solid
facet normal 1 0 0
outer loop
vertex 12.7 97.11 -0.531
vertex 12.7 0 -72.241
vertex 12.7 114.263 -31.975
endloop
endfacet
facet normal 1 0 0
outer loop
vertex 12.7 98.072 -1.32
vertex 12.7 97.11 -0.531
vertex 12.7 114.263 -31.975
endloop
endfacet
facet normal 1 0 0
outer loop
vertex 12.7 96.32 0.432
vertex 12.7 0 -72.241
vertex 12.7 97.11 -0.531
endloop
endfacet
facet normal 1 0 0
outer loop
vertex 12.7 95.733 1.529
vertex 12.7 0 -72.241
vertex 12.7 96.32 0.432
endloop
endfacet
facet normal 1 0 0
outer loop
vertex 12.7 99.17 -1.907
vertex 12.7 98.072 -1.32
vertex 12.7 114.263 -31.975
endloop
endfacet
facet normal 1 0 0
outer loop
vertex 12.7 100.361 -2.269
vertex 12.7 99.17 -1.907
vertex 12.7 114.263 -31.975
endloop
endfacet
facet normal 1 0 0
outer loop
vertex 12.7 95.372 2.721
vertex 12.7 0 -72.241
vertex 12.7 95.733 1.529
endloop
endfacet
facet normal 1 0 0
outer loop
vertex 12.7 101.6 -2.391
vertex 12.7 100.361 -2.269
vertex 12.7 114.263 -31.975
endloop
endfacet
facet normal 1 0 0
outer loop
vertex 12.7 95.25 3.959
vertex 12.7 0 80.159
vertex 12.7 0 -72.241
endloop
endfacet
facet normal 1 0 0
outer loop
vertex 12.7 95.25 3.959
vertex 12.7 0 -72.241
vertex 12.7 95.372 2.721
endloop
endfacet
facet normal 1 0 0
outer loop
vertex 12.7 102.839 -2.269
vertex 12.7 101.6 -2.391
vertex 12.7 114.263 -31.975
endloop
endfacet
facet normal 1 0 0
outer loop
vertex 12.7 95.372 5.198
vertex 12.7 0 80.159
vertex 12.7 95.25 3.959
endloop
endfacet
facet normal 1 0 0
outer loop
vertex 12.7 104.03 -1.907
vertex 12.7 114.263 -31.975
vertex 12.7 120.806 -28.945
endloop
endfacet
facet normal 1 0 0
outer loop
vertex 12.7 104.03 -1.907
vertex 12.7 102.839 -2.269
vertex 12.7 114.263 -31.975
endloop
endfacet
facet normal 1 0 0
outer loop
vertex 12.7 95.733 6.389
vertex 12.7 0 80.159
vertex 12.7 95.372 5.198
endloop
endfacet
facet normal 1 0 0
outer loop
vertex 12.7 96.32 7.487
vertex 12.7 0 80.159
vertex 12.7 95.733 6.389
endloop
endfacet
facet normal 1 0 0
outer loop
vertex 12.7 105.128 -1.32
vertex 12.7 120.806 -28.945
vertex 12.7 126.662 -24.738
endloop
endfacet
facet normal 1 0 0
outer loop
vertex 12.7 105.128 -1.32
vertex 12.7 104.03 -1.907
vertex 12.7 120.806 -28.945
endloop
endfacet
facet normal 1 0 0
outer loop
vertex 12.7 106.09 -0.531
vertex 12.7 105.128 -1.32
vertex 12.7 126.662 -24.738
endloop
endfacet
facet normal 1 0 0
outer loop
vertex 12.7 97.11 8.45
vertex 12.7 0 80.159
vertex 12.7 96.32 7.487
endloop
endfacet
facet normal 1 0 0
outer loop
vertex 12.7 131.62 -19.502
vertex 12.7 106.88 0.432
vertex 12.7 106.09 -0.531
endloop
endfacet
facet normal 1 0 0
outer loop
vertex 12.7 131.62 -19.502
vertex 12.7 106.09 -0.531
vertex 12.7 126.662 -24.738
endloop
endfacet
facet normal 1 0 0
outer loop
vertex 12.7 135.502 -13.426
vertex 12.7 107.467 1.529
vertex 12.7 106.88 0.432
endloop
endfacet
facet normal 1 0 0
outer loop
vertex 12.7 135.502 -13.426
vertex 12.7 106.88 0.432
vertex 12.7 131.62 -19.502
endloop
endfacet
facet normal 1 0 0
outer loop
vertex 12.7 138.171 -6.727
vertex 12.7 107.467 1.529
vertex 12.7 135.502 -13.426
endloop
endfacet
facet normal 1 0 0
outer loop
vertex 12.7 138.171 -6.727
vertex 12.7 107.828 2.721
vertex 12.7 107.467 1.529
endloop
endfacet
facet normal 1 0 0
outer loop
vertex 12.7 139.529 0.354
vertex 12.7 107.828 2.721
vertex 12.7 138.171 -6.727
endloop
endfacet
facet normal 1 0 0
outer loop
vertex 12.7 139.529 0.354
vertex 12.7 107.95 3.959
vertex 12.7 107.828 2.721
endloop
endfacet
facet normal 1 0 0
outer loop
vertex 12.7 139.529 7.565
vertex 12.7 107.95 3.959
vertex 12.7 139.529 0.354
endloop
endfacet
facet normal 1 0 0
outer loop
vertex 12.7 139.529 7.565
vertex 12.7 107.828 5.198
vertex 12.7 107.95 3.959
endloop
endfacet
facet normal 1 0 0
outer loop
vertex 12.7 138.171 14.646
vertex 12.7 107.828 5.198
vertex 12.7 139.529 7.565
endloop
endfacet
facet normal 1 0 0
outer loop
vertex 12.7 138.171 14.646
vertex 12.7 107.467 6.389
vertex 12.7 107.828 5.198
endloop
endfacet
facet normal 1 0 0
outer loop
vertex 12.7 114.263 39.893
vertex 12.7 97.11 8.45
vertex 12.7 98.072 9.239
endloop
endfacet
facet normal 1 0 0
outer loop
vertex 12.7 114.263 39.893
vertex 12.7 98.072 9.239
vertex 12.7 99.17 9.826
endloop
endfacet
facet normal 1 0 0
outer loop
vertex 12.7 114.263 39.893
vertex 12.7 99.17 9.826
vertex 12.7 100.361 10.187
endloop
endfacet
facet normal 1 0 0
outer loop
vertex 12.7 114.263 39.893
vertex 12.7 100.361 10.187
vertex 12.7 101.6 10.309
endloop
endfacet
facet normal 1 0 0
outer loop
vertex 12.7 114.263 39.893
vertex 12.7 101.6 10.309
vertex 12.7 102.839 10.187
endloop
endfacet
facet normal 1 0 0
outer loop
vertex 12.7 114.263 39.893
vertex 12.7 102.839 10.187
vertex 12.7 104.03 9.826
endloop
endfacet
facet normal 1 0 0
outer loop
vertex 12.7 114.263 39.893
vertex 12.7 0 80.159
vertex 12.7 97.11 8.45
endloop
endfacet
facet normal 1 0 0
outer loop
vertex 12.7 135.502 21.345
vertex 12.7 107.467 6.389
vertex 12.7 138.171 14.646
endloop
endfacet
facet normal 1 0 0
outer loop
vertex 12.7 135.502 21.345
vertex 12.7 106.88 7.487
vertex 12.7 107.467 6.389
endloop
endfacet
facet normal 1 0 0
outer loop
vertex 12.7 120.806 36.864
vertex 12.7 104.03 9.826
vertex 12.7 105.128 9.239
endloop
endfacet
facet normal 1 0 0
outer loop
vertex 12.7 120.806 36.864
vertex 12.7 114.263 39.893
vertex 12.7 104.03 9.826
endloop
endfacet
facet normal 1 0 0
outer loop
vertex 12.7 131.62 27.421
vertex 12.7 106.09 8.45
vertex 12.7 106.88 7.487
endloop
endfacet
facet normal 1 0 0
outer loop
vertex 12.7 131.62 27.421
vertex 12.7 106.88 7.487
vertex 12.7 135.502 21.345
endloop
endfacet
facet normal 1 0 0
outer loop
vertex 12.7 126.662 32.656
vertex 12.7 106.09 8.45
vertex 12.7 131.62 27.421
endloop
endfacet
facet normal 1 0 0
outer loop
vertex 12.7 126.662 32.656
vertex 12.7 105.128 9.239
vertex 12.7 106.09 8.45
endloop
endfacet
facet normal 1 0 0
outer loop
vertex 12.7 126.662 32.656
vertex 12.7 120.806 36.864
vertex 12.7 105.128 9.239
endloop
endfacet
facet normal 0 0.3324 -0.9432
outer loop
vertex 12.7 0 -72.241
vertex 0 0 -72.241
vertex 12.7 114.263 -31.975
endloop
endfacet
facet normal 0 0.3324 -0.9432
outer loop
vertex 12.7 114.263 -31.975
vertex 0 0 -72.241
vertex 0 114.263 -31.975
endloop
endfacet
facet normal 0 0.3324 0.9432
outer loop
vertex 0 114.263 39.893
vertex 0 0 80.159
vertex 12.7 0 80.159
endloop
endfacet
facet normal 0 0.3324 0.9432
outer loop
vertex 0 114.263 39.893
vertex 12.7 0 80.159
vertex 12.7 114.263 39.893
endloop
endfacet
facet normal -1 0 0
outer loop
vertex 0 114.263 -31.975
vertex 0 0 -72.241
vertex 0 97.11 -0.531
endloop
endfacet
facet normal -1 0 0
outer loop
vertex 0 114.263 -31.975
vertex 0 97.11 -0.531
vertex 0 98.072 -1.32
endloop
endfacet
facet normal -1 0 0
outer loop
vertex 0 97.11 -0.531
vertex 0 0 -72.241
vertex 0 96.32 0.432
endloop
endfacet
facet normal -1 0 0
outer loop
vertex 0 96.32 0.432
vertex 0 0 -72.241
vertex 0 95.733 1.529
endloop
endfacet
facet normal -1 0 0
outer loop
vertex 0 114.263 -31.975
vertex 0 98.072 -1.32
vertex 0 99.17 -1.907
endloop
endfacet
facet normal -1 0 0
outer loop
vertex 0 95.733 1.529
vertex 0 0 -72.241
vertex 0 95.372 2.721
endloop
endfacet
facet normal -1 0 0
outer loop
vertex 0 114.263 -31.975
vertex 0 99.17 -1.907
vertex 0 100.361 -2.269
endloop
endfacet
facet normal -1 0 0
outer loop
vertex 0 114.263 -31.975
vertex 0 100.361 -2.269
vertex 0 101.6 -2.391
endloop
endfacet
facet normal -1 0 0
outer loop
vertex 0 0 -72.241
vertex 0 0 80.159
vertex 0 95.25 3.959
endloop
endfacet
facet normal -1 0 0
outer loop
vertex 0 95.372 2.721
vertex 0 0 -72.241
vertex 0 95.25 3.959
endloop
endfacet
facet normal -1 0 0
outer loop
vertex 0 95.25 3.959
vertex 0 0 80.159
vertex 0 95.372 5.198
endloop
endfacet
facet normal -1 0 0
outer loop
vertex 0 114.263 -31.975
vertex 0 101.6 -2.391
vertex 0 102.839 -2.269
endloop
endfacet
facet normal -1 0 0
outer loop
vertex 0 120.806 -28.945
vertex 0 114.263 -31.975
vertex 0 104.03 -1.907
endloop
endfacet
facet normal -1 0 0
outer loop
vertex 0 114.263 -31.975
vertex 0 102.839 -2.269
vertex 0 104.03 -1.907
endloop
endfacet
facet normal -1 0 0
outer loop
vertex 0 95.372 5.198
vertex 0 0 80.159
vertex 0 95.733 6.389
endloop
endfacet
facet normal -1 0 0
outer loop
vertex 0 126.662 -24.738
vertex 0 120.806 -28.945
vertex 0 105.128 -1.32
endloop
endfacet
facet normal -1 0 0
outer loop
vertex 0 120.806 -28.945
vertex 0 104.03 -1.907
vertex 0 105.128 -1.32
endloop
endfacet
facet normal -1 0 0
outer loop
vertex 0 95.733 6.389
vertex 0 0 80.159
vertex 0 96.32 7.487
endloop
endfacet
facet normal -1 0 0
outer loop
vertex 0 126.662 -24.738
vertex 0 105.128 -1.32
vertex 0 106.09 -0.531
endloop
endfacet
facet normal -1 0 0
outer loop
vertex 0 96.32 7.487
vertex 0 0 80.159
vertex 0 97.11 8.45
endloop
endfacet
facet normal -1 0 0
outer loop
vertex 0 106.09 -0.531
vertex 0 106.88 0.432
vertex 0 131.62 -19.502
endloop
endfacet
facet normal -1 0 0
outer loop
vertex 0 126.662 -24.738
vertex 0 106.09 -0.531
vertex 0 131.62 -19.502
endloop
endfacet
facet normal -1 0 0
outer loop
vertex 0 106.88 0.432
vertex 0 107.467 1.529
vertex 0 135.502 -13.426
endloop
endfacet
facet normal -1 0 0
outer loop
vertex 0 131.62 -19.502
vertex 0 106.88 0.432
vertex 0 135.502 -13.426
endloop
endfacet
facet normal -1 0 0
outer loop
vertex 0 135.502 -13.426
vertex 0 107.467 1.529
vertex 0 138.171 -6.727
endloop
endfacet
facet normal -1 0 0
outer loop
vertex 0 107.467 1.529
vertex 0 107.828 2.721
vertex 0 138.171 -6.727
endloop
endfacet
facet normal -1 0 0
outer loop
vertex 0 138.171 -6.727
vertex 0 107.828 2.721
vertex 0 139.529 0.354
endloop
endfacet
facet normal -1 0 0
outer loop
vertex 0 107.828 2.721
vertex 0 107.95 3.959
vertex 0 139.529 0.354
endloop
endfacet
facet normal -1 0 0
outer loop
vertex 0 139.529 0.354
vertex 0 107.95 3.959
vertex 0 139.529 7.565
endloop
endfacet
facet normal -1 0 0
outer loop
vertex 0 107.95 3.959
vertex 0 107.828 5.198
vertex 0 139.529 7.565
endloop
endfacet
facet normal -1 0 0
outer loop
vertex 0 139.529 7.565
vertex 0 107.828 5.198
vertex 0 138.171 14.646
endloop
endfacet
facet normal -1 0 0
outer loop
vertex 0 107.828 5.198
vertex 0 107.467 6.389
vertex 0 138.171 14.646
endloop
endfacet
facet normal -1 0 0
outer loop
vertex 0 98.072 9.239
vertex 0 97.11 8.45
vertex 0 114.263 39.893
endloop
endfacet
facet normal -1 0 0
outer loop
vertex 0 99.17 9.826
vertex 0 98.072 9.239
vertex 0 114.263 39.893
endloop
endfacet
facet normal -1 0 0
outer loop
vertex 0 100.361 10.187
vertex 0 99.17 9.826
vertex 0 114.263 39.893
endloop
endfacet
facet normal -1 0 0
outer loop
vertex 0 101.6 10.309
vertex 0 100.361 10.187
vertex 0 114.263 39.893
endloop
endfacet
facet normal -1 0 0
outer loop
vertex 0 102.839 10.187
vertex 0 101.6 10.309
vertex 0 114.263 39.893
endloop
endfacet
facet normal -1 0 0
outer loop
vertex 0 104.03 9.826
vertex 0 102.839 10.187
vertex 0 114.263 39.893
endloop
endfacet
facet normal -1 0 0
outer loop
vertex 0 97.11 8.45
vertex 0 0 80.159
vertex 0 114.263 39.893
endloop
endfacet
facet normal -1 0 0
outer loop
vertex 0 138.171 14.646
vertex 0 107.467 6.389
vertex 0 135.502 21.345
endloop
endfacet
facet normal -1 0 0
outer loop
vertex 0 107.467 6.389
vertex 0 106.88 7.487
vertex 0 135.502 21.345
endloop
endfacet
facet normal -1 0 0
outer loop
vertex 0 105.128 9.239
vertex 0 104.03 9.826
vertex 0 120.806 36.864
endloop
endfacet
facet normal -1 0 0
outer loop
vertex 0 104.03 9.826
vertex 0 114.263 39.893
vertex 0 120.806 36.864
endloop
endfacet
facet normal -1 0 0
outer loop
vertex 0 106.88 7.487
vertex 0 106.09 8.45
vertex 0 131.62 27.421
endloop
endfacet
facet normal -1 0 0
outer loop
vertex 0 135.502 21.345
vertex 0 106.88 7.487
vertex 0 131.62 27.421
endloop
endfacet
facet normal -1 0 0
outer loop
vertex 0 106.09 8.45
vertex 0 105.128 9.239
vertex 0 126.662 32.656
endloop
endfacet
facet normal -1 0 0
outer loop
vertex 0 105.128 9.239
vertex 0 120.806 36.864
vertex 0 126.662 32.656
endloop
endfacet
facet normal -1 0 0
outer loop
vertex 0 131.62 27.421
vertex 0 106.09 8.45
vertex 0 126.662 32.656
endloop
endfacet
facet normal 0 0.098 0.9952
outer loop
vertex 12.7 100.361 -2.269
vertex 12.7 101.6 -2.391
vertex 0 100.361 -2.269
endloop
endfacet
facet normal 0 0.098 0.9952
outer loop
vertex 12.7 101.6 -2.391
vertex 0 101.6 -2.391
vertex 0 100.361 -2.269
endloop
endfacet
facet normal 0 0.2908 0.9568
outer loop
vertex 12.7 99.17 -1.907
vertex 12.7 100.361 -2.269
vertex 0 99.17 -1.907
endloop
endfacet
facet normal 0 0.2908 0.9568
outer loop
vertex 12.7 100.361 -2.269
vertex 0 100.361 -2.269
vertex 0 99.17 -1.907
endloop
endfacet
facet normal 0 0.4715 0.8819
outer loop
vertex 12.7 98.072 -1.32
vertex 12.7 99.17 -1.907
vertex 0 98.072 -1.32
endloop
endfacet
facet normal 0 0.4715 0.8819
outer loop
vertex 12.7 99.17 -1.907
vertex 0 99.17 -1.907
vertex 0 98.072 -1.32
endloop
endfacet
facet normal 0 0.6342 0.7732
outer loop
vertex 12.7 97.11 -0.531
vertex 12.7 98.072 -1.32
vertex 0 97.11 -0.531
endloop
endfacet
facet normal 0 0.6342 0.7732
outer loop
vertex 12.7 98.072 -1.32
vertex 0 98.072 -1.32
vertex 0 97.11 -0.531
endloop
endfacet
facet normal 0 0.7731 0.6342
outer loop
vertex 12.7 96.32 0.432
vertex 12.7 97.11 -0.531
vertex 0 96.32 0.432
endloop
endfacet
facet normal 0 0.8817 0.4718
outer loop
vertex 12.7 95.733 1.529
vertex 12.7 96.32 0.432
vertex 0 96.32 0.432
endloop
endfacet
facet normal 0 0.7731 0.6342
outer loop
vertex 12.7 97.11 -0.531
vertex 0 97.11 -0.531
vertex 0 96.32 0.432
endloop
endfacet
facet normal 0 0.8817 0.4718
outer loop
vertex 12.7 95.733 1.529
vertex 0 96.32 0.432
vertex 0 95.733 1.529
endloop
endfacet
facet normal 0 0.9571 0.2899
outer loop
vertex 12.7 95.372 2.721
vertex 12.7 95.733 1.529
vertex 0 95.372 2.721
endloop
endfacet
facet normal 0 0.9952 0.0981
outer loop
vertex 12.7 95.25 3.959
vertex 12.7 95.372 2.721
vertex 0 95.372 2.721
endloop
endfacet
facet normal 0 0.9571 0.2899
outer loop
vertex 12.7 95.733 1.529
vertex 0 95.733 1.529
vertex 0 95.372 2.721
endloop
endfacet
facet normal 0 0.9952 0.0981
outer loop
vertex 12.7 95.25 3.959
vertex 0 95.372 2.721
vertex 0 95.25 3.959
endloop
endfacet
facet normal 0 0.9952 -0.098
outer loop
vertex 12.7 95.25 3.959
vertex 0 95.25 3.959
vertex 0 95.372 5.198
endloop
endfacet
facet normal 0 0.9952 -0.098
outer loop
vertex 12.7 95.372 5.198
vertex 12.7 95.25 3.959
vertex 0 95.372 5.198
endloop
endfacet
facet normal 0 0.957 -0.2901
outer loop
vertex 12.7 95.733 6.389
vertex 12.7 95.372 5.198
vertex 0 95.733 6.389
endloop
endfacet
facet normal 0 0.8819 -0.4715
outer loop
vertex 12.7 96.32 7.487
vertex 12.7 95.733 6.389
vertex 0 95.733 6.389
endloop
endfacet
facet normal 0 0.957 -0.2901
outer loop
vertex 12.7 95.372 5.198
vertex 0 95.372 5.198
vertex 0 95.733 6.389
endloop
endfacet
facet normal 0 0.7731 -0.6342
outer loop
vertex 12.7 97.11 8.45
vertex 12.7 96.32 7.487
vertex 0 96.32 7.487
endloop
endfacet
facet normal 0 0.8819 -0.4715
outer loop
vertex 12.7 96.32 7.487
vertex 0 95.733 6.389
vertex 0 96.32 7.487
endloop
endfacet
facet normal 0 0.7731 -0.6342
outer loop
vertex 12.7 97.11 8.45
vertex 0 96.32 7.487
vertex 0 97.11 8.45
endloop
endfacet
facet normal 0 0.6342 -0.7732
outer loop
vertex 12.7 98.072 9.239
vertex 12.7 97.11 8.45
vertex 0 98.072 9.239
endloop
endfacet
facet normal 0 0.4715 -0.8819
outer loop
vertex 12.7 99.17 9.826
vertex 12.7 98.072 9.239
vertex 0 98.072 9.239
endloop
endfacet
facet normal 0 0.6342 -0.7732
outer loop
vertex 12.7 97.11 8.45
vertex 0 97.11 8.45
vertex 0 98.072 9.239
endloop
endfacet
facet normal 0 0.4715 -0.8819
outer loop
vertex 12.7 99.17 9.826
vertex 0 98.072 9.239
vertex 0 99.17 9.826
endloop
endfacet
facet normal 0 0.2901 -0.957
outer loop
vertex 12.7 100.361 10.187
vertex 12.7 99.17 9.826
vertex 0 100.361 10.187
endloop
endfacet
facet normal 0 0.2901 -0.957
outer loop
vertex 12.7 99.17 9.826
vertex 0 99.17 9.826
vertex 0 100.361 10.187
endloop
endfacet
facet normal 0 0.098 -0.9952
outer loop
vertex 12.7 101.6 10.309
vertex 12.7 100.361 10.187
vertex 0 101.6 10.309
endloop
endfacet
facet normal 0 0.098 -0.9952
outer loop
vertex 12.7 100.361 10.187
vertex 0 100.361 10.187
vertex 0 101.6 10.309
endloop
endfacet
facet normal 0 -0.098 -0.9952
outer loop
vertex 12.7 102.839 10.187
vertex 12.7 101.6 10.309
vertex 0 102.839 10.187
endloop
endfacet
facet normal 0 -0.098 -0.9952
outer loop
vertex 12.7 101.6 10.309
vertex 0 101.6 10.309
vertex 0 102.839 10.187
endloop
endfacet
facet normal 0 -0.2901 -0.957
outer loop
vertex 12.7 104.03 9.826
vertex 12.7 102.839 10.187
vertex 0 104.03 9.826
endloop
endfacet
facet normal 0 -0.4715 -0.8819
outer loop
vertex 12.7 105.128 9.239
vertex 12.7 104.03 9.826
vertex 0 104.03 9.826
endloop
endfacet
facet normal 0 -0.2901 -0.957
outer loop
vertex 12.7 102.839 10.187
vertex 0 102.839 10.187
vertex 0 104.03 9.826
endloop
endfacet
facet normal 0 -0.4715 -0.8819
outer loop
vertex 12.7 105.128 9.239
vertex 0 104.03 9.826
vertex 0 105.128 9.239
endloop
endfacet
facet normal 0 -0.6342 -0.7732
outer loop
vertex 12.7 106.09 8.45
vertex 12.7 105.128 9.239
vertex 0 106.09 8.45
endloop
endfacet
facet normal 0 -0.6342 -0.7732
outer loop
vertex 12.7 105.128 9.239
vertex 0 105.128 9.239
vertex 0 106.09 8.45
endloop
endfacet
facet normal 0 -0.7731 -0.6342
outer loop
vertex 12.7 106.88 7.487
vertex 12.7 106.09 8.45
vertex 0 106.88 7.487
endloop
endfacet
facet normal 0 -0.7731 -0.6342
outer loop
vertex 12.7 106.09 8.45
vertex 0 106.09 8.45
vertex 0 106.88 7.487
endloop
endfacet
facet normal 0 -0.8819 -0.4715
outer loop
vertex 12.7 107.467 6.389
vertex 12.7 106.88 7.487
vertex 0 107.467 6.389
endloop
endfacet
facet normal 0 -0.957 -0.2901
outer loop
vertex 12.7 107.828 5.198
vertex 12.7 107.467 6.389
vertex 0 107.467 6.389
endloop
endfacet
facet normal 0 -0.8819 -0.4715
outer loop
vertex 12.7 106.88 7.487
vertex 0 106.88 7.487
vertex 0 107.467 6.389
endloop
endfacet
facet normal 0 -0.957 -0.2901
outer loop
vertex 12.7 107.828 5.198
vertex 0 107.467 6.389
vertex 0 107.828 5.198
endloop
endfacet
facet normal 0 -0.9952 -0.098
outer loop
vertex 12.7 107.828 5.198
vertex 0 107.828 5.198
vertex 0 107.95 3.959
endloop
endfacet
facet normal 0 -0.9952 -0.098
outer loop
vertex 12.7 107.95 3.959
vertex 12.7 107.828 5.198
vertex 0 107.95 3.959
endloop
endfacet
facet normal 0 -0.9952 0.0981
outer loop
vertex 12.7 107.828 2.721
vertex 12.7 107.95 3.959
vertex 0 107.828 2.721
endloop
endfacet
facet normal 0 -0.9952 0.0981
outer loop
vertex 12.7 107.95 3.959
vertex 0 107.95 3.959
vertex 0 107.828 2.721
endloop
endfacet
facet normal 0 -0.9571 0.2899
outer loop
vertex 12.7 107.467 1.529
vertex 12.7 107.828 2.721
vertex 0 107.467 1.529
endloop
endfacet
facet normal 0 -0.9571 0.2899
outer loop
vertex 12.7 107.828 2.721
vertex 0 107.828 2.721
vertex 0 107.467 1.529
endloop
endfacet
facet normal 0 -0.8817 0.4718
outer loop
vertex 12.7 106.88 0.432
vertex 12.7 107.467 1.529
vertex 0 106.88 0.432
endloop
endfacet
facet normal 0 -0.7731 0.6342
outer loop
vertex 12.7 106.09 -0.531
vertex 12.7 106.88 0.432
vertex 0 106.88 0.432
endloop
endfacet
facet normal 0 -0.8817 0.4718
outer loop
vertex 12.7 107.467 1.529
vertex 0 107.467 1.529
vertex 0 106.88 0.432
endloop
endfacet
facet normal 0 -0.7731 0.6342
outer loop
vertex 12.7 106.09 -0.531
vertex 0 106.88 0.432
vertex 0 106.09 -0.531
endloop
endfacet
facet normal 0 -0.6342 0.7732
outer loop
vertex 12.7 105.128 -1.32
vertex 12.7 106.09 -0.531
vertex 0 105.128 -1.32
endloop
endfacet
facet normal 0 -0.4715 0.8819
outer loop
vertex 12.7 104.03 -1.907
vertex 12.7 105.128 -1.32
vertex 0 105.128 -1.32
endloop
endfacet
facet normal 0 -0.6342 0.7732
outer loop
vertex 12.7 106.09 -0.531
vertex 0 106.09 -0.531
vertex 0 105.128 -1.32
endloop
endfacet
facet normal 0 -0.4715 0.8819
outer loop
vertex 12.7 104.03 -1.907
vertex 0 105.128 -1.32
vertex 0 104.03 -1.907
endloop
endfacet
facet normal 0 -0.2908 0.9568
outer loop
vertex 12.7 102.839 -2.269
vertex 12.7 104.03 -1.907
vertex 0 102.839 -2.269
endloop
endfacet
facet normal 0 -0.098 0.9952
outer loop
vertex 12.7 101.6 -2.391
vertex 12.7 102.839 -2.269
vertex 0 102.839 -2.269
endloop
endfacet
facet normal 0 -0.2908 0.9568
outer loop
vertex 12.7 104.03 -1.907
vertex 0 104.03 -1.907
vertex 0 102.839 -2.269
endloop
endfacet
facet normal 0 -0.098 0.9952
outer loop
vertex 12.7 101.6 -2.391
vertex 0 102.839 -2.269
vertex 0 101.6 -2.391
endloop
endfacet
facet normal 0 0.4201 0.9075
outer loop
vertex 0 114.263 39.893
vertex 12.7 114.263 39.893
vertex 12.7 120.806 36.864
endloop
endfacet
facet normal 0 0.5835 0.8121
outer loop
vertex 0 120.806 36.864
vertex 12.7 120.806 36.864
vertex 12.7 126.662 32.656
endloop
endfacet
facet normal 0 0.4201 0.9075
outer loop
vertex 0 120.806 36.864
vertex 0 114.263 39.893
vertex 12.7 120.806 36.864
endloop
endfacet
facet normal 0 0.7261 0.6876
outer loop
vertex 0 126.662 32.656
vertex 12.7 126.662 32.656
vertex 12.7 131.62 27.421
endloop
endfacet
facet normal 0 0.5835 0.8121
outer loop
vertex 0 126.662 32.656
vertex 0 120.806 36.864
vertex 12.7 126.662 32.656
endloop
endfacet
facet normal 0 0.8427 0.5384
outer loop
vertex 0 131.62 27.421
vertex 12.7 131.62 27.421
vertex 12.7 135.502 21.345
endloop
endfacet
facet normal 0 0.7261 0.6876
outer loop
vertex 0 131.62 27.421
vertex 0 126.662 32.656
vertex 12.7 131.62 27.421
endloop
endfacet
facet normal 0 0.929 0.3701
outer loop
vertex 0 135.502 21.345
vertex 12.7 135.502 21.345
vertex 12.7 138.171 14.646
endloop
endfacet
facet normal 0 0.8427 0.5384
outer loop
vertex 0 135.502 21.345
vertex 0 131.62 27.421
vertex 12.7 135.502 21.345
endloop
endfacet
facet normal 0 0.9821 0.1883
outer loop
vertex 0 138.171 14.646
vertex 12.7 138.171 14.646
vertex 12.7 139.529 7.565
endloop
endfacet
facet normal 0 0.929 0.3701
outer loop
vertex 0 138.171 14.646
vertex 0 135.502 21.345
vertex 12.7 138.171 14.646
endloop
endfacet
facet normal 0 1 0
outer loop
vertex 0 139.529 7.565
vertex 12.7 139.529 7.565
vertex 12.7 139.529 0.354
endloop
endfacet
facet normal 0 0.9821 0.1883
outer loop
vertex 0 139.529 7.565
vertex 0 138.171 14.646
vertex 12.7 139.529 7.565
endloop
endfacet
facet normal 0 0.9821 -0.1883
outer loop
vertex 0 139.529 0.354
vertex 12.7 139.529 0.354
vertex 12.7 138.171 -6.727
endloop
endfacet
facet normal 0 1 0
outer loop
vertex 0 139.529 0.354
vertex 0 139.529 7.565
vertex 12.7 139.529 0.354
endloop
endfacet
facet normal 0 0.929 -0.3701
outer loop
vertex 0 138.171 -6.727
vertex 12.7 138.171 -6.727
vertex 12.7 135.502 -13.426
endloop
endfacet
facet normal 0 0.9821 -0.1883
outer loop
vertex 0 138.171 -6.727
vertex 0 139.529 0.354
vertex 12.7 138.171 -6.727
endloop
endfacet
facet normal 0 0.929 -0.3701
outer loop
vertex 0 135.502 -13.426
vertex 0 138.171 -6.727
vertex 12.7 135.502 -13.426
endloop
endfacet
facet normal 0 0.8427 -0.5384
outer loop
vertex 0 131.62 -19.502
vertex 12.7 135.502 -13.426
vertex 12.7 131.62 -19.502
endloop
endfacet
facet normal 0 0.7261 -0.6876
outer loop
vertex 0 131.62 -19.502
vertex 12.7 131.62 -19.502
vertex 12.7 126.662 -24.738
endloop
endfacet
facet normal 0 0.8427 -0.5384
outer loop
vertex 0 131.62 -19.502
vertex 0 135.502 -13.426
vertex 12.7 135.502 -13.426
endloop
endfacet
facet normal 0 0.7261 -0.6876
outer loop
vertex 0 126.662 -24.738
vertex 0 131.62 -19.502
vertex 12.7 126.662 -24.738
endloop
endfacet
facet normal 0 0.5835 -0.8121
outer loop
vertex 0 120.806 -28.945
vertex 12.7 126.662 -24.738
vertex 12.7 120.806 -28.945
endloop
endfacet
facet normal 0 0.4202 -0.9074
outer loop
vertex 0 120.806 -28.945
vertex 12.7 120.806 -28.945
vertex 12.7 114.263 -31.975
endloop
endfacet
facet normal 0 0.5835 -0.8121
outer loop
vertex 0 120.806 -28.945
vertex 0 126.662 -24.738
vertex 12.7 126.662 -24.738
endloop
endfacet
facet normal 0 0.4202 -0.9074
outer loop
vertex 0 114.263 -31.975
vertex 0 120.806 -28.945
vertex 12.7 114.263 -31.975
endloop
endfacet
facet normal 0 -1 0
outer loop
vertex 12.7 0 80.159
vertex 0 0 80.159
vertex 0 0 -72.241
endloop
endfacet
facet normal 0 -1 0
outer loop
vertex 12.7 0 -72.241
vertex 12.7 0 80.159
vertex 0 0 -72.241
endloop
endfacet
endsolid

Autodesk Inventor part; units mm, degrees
ref_plane "YZ Plane" through (0, 0, 0) normal (1, 0, 0) x (0, 1, 0)
ref_plane "XZ Plane" through (0, 0, 0) normal (0, 1, 0) x (-1, 0, 0)
ref_plane "XY Plane" through (0, 0, 0) normal (0, 0, 1) x (1, 0, 0)
sketch "Sketch1" plane through (0, 0, 0) normal (1, 0, 0) x (0, 1, 0)
  line L0 (0, 80.1594) -> (0, -72.2406)
  circle A0 centre (101.6, 3.9594) radius 38.1
  line L1 (0, -72.2406) -> (114.2631, -31.9747)
  line L2 (0, 80.1594) -> (114.2631, 39.8934)
  point P0 (0, 0)
  dimension "d0" = 152.4
  dimension "d1" = 76.2
  dimension "d2" = 101.6
extrude "Extrusion1" add sketch "Sketch1" along normal blind 12.7
sketch "Sketch2" plane through (12.7, 0, 0) normal (1, 0, 0) x (0, 0, -1)
  arc A0 (31.9747, 114.2631) -> (-39.8934, 114.2631) centre (-3.9594, 101.6) ccw projected
  point P0 (0, 0)
hole "Hole1" at (12.7, 101.6, 3.9594) direction (-1, 0, 0) diameter 12.7 end through all
properties part number "Roller Frame"
